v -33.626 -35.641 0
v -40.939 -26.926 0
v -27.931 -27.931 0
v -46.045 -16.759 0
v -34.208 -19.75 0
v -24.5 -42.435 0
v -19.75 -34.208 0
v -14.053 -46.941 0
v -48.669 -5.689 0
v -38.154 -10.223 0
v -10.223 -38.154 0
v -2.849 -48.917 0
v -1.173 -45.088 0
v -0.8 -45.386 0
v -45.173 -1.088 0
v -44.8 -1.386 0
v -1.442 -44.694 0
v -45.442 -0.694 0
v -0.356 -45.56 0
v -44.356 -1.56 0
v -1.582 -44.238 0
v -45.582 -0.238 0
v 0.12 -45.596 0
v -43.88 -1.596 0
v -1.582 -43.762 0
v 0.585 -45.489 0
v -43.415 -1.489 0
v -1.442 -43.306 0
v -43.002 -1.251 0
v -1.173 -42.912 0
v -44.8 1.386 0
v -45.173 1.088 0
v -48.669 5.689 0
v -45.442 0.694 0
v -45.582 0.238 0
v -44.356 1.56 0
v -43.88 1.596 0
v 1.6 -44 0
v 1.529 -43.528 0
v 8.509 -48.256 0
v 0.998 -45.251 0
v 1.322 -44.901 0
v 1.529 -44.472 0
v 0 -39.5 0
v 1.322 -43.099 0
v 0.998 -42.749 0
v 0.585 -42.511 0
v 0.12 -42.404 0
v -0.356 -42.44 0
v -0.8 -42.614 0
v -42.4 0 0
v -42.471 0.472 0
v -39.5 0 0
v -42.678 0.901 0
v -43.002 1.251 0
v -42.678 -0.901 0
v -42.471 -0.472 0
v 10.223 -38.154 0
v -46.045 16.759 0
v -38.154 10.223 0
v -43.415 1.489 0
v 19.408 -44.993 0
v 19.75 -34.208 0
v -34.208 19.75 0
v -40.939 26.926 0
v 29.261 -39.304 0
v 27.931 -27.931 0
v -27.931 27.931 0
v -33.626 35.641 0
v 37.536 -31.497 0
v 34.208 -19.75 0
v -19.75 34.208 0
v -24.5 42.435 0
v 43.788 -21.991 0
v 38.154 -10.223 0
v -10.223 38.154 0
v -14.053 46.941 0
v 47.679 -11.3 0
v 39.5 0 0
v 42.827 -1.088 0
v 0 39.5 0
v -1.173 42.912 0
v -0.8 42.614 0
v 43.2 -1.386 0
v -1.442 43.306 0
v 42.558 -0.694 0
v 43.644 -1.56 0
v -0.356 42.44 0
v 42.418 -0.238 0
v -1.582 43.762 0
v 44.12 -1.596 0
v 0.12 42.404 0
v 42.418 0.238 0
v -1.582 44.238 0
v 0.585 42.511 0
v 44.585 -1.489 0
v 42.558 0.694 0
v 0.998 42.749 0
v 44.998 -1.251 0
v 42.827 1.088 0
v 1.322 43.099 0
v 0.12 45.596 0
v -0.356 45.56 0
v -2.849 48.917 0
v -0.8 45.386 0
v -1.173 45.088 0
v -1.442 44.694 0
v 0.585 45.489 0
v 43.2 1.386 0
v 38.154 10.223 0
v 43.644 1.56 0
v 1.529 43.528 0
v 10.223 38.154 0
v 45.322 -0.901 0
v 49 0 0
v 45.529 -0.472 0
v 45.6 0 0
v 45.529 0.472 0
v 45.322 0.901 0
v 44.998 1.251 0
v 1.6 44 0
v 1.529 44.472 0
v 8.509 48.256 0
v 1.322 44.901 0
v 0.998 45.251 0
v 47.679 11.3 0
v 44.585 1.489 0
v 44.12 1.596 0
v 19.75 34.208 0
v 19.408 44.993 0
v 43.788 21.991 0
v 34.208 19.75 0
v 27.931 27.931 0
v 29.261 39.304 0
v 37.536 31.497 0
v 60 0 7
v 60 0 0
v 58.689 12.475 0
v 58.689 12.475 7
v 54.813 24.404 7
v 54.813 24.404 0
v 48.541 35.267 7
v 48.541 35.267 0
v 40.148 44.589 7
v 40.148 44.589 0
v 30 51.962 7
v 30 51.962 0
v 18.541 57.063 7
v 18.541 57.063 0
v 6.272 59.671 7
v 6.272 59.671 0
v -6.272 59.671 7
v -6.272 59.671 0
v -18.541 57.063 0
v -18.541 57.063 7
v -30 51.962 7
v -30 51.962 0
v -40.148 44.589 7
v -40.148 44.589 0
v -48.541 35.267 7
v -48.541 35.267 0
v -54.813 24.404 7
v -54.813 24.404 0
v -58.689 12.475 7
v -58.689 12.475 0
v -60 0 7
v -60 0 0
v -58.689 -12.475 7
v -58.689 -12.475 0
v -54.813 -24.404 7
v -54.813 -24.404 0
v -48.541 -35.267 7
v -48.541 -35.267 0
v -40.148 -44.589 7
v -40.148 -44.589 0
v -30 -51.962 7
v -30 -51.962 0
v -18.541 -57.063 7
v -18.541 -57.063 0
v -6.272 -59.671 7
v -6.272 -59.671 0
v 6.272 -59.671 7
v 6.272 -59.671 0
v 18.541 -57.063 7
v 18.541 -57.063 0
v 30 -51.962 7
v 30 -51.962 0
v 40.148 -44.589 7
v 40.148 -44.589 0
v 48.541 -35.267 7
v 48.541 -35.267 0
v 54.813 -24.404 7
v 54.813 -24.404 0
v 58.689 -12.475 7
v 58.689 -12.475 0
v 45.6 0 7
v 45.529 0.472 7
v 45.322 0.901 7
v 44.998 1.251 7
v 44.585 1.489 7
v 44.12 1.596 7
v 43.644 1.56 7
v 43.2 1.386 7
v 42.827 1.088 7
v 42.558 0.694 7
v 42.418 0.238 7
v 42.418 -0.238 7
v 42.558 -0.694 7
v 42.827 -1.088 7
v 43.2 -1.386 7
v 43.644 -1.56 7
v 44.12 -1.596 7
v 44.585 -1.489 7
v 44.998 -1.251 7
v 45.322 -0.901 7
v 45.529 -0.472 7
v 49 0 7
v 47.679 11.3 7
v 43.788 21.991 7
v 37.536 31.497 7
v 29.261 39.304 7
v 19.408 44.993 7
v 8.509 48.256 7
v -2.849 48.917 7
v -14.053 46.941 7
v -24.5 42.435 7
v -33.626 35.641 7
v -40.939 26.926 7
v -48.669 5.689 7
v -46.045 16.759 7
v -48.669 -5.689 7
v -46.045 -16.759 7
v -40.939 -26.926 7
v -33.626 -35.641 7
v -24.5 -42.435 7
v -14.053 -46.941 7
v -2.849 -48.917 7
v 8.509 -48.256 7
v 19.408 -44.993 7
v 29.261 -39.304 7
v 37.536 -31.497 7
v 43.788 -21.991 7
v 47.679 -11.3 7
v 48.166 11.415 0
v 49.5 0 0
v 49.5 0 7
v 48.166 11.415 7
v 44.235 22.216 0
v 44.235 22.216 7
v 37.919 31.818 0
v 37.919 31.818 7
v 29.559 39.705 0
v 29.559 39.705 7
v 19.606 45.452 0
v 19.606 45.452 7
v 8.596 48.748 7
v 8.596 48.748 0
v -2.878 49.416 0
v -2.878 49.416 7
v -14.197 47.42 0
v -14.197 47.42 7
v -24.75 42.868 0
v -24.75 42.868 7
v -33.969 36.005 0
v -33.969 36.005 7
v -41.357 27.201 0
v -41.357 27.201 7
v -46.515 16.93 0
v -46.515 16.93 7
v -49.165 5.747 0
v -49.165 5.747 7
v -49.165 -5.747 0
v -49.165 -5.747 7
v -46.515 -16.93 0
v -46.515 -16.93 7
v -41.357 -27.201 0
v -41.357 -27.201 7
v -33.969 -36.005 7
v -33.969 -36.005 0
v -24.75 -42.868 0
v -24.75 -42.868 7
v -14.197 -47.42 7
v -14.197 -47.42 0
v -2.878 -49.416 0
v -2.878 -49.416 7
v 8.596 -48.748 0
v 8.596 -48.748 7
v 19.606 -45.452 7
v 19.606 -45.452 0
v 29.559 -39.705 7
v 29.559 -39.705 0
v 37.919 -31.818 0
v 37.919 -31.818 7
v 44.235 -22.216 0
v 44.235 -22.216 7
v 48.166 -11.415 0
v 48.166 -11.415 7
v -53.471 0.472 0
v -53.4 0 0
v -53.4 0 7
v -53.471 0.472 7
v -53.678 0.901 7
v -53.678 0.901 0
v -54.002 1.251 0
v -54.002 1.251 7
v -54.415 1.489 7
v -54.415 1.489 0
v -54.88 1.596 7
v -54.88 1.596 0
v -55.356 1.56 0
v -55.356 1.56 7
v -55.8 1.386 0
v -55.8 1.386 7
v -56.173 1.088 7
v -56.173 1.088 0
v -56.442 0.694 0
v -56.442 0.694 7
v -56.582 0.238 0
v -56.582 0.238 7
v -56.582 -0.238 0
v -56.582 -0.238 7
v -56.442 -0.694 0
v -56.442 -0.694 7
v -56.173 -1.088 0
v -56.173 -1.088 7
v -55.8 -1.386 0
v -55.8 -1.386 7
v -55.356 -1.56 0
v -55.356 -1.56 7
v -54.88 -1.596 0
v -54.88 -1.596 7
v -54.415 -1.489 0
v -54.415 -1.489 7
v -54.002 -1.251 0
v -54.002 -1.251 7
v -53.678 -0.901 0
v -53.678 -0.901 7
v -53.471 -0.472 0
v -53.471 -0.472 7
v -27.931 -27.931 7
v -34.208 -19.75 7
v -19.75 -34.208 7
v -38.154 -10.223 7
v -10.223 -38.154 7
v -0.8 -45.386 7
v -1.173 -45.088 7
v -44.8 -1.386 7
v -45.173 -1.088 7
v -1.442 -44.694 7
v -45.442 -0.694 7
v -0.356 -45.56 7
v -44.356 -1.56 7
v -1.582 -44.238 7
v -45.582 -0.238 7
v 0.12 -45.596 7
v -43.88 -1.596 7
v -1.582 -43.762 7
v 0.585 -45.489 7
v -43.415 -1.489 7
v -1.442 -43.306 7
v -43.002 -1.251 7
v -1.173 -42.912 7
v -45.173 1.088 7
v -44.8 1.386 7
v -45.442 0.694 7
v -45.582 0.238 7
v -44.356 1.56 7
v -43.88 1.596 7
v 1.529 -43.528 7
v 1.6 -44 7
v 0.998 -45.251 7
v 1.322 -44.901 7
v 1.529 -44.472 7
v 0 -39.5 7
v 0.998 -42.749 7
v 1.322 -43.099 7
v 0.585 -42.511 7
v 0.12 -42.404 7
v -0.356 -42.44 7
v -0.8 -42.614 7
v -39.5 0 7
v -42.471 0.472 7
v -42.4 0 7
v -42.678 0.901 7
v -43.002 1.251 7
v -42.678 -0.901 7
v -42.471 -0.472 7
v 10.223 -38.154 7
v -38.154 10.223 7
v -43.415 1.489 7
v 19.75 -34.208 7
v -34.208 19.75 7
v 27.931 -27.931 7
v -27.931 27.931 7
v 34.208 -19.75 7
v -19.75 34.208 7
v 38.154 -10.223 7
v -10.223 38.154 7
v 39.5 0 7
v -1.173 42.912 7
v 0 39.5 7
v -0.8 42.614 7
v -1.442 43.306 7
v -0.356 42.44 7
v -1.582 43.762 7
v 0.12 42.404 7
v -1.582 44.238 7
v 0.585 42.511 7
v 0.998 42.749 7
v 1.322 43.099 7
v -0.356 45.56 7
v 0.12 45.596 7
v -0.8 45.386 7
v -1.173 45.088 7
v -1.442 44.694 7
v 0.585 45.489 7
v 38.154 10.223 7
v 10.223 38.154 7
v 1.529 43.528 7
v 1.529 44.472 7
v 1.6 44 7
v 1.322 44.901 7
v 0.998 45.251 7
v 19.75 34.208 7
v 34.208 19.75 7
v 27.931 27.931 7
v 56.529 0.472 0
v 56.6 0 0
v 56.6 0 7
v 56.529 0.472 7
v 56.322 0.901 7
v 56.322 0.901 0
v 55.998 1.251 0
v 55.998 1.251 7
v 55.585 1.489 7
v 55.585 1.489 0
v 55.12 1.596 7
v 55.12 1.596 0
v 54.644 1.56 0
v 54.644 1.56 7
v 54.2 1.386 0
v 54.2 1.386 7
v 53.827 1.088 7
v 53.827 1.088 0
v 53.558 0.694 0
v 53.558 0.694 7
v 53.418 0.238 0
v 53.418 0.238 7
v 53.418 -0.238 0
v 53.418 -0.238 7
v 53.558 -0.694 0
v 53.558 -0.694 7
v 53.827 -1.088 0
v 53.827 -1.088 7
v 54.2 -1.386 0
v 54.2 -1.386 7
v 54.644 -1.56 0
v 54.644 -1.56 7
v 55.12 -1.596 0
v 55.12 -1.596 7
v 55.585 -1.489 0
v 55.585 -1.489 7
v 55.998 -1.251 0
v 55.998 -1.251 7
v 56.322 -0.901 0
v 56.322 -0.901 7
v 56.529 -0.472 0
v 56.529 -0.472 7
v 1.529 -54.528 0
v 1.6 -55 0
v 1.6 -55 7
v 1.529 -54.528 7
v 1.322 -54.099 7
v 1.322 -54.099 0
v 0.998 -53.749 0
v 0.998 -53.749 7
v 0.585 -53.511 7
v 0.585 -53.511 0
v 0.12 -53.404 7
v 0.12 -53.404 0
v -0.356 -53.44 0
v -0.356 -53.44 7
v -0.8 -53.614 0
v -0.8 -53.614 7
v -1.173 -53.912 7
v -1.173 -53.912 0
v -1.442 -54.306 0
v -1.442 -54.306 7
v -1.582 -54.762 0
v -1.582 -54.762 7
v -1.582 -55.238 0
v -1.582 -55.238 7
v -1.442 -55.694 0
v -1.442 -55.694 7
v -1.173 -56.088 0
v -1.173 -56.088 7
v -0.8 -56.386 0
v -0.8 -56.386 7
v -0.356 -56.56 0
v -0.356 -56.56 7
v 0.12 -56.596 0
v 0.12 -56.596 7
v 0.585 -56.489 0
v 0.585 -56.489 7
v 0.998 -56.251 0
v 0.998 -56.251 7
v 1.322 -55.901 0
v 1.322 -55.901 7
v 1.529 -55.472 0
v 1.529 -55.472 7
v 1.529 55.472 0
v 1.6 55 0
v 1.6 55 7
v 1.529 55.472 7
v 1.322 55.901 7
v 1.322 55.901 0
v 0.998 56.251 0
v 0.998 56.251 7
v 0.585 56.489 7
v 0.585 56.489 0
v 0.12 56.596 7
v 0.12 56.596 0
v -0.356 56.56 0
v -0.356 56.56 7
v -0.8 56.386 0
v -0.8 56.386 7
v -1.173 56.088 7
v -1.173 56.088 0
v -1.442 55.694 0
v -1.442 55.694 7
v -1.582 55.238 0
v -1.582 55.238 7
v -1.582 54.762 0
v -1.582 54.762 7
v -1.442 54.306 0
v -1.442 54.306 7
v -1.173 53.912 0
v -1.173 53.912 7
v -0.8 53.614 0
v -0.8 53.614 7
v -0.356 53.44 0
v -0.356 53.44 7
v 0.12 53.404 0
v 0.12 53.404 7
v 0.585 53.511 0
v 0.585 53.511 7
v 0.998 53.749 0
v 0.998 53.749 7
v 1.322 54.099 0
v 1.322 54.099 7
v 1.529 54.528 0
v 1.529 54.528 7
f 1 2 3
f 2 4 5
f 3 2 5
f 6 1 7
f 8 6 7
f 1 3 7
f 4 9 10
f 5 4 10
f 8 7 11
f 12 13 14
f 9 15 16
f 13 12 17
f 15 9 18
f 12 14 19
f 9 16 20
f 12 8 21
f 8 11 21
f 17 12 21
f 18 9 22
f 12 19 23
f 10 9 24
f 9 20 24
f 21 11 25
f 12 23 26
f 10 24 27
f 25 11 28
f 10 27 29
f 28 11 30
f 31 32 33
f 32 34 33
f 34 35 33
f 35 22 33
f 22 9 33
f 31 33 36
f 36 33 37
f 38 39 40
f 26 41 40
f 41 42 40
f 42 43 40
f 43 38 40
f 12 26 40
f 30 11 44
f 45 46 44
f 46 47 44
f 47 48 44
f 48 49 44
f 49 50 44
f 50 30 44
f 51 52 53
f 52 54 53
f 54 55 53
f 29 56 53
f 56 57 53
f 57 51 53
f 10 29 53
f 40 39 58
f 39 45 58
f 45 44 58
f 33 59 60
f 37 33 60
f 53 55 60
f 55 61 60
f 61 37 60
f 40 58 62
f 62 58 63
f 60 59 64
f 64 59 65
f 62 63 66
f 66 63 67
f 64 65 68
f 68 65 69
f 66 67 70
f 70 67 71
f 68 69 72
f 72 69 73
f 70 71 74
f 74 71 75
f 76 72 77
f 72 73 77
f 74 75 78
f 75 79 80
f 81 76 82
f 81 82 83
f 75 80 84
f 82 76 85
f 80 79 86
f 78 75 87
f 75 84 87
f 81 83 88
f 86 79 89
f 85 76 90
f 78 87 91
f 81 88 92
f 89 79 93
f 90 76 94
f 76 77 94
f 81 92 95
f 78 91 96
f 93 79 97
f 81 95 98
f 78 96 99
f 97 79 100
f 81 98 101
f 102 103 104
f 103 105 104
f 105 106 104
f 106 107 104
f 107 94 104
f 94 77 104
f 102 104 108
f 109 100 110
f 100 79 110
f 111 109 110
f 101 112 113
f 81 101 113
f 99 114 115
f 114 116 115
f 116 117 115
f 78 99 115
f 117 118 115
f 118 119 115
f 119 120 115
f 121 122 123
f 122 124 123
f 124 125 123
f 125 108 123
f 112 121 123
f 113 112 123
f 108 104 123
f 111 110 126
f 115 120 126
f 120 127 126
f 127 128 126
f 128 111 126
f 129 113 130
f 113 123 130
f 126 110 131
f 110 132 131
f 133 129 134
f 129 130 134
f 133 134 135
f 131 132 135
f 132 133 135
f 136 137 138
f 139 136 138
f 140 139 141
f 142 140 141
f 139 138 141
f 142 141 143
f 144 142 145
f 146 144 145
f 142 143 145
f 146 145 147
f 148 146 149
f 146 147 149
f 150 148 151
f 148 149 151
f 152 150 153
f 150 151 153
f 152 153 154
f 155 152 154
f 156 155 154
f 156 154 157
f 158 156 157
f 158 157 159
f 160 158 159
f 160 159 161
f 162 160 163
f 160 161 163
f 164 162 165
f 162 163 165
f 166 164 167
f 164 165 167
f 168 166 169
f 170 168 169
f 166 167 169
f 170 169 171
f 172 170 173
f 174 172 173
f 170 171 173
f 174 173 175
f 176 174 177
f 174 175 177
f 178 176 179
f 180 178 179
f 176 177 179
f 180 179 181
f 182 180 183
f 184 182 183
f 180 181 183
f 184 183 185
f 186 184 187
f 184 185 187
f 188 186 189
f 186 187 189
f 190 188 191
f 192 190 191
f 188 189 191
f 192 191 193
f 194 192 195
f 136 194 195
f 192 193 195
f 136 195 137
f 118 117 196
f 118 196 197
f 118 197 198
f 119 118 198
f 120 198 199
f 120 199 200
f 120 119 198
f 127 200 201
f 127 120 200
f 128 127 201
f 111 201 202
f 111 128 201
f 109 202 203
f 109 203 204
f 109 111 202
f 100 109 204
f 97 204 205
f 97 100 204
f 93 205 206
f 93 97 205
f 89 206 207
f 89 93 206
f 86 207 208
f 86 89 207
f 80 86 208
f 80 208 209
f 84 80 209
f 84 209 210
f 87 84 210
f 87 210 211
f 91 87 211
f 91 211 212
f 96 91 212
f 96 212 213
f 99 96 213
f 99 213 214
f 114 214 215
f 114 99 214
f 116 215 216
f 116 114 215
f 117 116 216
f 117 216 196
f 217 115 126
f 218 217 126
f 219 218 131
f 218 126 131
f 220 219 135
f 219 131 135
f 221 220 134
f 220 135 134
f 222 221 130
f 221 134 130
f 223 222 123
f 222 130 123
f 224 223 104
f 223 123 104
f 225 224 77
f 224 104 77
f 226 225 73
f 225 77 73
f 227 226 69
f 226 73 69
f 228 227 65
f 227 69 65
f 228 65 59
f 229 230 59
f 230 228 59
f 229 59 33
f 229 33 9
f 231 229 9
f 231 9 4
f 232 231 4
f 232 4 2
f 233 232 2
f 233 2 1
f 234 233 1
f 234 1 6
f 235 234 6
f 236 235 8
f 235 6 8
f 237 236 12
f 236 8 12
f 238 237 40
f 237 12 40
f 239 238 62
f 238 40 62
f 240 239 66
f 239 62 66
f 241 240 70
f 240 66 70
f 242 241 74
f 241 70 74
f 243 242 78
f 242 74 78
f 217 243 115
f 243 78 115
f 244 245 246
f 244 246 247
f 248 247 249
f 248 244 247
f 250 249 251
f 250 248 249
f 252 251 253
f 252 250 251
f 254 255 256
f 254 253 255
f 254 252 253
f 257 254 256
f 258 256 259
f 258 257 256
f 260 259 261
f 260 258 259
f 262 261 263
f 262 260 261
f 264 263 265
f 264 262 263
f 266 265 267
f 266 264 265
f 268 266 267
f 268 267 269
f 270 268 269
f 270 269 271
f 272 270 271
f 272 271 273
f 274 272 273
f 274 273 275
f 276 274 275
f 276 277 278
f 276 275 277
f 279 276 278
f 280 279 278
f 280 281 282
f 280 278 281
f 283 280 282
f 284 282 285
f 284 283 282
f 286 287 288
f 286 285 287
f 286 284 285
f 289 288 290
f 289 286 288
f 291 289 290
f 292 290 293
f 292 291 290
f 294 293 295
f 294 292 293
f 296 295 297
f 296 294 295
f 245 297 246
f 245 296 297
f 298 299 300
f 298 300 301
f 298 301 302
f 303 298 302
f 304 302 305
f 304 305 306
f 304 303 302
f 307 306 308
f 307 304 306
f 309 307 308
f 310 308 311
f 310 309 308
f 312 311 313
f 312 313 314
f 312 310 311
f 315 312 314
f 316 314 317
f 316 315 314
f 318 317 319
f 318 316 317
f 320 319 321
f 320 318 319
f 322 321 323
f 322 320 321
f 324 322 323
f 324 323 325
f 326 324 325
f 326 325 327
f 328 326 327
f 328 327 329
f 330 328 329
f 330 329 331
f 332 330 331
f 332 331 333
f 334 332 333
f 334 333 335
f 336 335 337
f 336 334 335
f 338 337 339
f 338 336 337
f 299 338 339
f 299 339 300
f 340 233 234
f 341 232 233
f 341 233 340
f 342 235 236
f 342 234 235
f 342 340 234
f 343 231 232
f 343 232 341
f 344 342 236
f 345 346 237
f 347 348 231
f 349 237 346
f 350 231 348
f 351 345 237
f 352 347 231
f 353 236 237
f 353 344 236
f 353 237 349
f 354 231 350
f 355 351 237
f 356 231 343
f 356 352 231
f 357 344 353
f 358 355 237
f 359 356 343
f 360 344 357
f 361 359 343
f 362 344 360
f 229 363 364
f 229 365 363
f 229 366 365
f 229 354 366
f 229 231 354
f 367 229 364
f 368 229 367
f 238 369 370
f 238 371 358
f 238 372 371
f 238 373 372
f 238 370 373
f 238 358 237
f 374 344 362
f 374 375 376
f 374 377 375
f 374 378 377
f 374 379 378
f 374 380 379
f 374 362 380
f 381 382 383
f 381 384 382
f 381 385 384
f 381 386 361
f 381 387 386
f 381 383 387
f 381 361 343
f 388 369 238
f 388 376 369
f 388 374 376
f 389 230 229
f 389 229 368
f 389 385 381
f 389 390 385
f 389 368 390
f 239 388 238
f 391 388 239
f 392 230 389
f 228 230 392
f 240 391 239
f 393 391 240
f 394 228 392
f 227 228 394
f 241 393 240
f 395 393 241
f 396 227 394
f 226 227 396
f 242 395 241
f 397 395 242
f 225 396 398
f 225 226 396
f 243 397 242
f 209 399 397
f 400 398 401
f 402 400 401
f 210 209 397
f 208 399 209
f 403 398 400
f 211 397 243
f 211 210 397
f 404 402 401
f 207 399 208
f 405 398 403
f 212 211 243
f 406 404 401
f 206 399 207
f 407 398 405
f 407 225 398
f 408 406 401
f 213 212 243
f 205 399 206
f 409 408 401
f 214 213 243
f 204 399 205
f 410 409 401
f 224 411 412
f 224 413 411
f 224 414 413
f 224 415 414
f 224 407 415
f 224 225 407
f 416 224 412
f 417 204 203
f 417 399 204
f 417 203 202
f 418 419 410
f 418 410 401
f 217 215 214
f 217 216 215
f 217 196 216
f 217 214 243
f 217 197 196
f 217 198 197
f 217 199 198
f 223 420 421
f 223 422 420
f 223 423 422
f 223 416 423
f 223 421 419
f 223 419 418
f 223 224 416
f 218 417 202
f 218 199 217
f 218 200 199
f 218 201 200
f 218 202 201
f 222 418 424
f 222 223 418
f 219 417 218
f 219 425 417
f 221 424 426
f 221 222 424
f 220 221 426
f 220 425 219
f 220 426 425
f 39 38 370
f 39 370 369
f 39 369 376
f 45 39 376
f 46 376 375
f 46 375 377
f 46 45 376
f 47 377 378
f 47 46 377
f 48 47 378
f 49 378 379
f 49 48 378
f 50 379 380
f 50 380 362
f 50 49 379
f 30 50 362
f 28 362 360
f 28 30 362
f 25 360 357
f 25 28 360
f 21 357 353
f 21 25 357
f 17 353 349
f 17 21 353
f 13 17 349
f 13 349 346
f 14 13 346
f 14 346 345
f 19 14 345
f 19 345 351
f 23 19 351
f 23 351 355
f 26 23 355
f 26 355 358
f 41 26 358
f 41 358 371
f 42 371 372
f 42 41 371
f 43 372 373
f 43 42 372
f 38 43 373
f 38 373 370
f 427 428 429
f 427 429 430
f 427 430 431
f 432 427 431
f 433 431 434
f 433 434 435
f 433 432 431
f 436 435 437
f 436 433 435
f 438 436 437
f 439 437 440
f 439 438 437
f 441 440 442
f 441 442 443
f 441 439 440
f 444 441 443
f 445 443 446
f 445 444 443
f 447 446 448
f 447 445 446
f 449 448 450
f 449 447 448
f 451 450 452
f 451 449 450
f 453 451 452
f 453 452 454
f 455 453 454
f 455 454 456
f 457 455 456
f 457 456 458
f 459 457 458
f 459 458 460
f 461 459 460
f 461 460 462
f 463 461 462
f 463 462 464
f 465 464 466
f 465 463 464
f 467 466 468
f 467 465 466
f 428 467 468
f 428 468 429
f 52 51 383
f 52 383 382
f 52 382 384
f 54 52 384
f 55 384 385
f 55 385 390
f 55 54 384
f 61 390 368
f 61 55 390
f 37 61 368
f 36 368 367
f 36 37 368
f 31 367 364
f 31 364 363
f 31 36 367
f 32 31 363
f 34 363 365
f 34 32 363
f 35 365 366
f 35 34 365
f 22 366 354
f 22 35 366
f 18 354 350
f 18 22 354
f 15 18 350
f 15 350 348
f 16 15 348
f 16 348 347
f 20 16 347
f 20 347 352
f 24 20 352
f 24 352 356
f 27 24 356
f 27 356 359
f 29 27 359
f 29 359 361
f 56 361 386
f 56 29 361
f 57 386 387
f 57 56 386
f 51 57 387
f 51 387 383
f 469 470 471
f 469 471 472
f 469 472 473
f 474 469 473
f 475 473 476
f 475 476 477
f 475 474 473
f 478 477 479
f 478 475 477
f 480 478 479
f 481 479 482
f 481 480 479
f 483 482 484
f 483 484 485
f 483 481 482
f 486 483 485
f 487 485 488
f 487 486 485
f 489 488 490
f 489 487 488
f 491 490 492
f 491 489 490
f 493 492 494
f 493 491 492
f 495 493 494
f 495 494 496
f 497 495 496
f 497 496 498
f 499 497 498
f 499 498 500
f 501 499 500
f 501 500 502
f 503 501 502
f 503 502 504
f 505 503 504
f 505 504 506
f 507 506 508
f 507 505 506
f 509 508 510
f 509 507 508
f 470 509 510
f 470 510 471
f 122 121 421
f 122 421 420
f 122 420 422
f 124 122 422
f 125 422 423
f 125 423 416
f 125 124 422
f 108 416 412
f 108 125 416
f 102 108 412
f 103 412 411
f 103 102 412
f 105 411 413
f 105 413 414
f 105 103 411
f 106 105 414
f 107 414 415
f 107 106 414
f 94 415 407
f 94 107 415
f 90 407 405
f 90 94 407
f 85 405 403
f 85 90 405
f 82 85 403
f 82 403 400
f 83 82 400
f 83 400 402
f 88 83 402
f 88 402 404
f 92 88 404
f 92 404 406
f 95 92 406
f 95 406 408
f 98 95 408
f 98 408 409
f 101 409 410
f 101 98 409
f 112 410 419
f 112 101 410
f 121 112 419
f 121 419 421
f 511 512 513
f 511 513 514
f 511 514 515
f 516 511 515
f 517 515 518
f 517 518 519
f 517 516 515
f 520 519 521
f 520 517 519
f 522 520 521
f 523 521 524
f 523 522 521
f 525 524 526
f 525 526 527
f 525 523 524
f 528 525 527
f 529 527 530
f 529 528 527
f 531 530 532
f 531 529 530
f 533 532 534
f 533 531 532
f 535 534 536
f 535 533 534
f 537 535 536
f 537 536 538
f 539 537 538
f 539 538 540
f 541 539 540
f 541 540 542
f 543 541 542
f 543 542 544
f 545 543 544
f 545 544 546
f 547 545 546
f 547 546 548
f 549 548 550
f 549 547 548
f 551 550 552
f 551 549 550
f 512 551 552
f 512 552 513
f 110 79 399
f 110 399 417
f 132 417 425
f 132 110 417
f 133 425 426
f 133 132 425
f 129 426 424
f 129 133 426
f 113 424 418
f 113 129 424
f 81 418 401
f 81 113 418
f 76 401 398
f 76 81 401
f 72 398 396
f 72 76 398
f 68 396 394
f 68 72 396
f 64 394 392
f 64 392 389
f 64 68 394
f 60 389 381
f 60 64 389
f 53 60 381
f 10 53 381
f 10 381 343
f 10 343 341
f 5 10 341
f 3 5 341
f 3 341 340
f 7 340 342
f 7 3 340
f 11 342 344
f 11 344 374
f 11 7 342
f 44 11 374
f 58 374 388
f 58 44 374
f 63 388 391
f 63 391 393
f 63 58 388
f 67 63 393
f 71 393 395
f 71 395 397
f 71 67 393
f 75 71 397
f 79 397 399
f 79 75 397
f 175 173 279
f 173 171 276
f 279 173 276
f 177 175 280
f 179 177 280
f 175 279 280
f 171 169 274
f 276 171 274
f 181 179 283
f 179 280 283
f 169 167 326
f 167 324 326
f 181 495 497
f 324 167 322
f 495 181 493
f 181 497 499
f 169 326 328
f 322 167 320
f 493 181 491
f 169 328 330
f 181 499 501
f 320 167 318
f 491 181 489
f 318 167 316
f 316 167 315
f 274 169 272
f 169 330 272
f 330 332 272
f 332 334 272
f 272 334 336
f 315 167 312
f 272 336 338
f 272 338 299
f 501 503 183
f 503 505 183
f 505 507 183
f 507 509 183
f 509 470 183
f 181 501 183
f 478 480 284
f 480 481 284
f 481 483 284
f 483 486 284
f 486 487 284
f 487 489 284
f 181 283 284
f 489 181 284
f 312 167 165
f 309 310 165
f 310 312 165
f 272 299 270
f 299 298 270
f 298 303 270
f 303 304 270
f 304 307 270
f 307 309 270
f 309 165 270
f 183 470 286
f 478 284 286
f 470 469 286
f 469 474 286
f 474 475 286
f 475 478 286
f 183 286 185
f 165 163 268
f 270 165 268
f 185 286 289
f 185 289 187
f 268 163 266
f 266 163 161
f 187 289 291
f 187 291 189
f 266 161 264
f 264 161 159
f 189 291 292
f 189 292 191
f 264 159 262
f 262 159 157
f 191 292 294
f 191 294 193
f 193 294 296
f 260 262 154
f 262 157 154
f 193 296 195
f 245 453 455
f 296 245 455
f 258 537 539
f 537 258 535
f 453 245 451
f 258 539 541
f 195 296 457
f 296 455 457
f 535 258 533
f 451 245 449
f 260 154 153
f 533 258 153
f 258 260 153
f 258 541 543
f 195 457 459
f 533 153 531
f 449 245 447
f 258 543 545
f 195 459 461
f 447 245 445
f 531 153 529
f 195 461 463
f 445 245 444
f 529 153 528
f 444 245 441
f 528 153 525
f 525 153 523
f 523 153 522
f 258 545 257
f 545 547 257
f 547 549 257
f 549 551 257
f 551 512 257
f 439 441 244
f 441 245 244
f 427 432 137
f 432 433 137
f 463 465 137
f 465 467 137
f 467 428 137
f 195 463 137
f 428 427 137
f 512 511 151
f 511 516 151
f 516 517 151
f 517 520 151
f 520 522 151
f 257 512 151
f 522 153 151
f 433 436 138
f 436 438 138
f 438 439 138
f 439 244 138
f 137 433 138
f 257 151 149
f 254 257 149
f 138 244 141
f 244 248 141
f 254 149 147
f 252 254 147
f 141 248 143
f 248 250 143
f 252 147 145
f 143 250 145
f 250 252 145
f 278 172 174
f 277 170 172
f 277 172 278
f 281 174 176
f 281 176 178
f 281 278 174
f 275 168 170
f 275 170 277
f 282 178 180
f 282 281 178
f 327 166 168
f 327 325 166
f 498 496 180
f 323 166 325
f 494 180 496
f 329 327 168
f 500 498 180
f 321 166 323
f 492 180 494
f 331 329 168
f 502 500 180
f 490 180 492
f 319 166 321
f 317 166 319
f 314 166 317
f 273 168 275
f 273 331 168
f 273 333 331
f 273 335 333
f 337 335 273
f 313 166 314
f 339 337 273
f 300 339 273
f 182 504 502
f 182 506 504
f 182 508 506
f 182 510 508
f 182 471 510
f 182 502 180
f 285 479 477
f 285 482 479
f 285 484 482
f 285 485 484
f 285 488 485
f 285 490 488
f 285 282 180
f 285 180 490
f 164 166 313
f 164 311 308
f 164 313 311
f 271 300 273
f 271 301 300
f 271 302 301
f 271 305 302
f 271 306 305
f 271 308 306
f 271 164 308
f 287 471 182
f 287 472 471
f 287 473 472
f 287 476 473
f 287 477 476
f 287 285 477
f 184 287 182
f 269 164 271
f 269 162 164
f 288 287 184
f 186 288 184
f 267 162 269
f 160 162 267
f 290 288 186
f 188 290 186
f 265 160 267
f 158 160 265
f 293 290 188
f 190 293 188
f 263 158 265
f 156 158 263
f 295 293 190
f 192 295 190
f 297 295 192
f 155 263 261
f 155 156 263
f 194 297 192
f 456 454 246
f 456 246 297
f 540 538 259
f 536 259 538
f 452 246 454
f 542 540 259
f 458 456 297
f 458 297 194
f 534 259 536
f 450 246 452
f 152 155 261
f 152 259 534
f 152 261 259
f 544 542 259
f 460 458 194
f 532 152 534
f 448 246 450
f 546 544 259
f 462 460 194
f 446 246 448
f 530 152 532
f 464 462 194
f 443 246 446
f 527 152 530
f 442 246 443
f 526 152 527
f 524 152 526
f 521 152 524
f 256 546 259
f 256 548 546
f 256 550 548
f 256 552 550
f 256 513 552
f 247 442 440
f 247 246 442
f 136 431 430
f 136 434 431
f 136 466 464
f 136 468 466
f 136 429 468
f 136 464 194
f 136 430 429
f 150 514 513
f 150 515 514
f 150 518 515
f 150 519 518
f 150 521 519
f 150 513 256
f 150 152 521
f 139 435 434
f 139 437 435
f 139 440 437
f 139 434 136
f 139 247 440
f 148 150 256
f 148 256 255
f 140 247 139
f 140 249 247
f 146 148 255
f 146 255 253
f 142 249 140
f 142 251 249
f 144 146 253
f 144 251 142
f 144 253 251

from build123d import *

# Parameters (mm, degrees)
SKETCH_1_R          = 60
SKETCH_1_R_2        = 39.5
SKETCH_1_R_3        = 1.6
EXTRUDE_4_DEPTH     = 7
SKETCH_2_R          = 49.5
SKETCH_2_R_2        = 49
CUT_EXTRUDE_1_DEPTH = 15


with BuildPart() as part:
    # 草图1 → 凸台-拉伸4 (new body)
    with BuildSketch(Plane.XY):
        Circle(SKETCH_1_R)
        Circle(SKETCH_1_R_2, mode=Mode.SUBTRACT)
        with Locations((0, 55)):
            Circle(SKETCH_1_R_3, mode=Mode.SUBTRACT)
        with Locations((55, 0)):
            Circle(SKETCH_1_R_3, mode=Mode.SUBTRACT)
        with Locations((0, -55)):
            Circle(SKETCH_1_R_3, mode=Mode.SUBTRACT)
        with Locations((-55, 0)):
            Circle(SKETCH_1_R_3, mode=Mode.SUBTRACT)
        with Locations((0, 44)):
            Circle(SKETCH_1_R_3, mode=Mode.SUBTRACT)
        with Locations((44, 0)):
            Circle(SKETCH_1_R_3, mode=Mode.SUBTRACT)
        with Locations((0, -44)):
            Circle(SKETCH_1_R_3, mode=Mode.SUBTRACT)
        with Locations((-44, 0)):
            Circle(SKETCH_1_R_3, mode=Mode.SUBTRACT)
    extrude(amount=EXTRUDE_4_DEPTH)

    # 草图2 → 切除-拉伸1 (cut)
    with BuildSketch(Plane.XY):
        Circle(SKETCH_2_R)
        Circle(SKETCH_2_R_2, mode=Mode.SUBTRACT)
    extrude(amount=CUT_EXTRUDE_1_DEPTH, mode=Mode.SUBTRACT)


with BuildPart() as cut_extrude_1_piece_1:
    # of the separate pieces the step leaves, piece 1, a body of its own (cut_extrude_1_pieces)
    add(part.part.solids().sort_by_distance((60, 0, 0))[0])


with BuildPart() as cut_extrude_1_piece_2:
    # of the separate pieces the step leaves, piece 2, a body of its own (cut_extrude_1_pieces)
    add(part.part.solids().sort_by_distance((49, 0, 0))[0])


solid = Compound([cut_extrude_1_piece_1.part, cut_extrude_1_piece_2.part])
